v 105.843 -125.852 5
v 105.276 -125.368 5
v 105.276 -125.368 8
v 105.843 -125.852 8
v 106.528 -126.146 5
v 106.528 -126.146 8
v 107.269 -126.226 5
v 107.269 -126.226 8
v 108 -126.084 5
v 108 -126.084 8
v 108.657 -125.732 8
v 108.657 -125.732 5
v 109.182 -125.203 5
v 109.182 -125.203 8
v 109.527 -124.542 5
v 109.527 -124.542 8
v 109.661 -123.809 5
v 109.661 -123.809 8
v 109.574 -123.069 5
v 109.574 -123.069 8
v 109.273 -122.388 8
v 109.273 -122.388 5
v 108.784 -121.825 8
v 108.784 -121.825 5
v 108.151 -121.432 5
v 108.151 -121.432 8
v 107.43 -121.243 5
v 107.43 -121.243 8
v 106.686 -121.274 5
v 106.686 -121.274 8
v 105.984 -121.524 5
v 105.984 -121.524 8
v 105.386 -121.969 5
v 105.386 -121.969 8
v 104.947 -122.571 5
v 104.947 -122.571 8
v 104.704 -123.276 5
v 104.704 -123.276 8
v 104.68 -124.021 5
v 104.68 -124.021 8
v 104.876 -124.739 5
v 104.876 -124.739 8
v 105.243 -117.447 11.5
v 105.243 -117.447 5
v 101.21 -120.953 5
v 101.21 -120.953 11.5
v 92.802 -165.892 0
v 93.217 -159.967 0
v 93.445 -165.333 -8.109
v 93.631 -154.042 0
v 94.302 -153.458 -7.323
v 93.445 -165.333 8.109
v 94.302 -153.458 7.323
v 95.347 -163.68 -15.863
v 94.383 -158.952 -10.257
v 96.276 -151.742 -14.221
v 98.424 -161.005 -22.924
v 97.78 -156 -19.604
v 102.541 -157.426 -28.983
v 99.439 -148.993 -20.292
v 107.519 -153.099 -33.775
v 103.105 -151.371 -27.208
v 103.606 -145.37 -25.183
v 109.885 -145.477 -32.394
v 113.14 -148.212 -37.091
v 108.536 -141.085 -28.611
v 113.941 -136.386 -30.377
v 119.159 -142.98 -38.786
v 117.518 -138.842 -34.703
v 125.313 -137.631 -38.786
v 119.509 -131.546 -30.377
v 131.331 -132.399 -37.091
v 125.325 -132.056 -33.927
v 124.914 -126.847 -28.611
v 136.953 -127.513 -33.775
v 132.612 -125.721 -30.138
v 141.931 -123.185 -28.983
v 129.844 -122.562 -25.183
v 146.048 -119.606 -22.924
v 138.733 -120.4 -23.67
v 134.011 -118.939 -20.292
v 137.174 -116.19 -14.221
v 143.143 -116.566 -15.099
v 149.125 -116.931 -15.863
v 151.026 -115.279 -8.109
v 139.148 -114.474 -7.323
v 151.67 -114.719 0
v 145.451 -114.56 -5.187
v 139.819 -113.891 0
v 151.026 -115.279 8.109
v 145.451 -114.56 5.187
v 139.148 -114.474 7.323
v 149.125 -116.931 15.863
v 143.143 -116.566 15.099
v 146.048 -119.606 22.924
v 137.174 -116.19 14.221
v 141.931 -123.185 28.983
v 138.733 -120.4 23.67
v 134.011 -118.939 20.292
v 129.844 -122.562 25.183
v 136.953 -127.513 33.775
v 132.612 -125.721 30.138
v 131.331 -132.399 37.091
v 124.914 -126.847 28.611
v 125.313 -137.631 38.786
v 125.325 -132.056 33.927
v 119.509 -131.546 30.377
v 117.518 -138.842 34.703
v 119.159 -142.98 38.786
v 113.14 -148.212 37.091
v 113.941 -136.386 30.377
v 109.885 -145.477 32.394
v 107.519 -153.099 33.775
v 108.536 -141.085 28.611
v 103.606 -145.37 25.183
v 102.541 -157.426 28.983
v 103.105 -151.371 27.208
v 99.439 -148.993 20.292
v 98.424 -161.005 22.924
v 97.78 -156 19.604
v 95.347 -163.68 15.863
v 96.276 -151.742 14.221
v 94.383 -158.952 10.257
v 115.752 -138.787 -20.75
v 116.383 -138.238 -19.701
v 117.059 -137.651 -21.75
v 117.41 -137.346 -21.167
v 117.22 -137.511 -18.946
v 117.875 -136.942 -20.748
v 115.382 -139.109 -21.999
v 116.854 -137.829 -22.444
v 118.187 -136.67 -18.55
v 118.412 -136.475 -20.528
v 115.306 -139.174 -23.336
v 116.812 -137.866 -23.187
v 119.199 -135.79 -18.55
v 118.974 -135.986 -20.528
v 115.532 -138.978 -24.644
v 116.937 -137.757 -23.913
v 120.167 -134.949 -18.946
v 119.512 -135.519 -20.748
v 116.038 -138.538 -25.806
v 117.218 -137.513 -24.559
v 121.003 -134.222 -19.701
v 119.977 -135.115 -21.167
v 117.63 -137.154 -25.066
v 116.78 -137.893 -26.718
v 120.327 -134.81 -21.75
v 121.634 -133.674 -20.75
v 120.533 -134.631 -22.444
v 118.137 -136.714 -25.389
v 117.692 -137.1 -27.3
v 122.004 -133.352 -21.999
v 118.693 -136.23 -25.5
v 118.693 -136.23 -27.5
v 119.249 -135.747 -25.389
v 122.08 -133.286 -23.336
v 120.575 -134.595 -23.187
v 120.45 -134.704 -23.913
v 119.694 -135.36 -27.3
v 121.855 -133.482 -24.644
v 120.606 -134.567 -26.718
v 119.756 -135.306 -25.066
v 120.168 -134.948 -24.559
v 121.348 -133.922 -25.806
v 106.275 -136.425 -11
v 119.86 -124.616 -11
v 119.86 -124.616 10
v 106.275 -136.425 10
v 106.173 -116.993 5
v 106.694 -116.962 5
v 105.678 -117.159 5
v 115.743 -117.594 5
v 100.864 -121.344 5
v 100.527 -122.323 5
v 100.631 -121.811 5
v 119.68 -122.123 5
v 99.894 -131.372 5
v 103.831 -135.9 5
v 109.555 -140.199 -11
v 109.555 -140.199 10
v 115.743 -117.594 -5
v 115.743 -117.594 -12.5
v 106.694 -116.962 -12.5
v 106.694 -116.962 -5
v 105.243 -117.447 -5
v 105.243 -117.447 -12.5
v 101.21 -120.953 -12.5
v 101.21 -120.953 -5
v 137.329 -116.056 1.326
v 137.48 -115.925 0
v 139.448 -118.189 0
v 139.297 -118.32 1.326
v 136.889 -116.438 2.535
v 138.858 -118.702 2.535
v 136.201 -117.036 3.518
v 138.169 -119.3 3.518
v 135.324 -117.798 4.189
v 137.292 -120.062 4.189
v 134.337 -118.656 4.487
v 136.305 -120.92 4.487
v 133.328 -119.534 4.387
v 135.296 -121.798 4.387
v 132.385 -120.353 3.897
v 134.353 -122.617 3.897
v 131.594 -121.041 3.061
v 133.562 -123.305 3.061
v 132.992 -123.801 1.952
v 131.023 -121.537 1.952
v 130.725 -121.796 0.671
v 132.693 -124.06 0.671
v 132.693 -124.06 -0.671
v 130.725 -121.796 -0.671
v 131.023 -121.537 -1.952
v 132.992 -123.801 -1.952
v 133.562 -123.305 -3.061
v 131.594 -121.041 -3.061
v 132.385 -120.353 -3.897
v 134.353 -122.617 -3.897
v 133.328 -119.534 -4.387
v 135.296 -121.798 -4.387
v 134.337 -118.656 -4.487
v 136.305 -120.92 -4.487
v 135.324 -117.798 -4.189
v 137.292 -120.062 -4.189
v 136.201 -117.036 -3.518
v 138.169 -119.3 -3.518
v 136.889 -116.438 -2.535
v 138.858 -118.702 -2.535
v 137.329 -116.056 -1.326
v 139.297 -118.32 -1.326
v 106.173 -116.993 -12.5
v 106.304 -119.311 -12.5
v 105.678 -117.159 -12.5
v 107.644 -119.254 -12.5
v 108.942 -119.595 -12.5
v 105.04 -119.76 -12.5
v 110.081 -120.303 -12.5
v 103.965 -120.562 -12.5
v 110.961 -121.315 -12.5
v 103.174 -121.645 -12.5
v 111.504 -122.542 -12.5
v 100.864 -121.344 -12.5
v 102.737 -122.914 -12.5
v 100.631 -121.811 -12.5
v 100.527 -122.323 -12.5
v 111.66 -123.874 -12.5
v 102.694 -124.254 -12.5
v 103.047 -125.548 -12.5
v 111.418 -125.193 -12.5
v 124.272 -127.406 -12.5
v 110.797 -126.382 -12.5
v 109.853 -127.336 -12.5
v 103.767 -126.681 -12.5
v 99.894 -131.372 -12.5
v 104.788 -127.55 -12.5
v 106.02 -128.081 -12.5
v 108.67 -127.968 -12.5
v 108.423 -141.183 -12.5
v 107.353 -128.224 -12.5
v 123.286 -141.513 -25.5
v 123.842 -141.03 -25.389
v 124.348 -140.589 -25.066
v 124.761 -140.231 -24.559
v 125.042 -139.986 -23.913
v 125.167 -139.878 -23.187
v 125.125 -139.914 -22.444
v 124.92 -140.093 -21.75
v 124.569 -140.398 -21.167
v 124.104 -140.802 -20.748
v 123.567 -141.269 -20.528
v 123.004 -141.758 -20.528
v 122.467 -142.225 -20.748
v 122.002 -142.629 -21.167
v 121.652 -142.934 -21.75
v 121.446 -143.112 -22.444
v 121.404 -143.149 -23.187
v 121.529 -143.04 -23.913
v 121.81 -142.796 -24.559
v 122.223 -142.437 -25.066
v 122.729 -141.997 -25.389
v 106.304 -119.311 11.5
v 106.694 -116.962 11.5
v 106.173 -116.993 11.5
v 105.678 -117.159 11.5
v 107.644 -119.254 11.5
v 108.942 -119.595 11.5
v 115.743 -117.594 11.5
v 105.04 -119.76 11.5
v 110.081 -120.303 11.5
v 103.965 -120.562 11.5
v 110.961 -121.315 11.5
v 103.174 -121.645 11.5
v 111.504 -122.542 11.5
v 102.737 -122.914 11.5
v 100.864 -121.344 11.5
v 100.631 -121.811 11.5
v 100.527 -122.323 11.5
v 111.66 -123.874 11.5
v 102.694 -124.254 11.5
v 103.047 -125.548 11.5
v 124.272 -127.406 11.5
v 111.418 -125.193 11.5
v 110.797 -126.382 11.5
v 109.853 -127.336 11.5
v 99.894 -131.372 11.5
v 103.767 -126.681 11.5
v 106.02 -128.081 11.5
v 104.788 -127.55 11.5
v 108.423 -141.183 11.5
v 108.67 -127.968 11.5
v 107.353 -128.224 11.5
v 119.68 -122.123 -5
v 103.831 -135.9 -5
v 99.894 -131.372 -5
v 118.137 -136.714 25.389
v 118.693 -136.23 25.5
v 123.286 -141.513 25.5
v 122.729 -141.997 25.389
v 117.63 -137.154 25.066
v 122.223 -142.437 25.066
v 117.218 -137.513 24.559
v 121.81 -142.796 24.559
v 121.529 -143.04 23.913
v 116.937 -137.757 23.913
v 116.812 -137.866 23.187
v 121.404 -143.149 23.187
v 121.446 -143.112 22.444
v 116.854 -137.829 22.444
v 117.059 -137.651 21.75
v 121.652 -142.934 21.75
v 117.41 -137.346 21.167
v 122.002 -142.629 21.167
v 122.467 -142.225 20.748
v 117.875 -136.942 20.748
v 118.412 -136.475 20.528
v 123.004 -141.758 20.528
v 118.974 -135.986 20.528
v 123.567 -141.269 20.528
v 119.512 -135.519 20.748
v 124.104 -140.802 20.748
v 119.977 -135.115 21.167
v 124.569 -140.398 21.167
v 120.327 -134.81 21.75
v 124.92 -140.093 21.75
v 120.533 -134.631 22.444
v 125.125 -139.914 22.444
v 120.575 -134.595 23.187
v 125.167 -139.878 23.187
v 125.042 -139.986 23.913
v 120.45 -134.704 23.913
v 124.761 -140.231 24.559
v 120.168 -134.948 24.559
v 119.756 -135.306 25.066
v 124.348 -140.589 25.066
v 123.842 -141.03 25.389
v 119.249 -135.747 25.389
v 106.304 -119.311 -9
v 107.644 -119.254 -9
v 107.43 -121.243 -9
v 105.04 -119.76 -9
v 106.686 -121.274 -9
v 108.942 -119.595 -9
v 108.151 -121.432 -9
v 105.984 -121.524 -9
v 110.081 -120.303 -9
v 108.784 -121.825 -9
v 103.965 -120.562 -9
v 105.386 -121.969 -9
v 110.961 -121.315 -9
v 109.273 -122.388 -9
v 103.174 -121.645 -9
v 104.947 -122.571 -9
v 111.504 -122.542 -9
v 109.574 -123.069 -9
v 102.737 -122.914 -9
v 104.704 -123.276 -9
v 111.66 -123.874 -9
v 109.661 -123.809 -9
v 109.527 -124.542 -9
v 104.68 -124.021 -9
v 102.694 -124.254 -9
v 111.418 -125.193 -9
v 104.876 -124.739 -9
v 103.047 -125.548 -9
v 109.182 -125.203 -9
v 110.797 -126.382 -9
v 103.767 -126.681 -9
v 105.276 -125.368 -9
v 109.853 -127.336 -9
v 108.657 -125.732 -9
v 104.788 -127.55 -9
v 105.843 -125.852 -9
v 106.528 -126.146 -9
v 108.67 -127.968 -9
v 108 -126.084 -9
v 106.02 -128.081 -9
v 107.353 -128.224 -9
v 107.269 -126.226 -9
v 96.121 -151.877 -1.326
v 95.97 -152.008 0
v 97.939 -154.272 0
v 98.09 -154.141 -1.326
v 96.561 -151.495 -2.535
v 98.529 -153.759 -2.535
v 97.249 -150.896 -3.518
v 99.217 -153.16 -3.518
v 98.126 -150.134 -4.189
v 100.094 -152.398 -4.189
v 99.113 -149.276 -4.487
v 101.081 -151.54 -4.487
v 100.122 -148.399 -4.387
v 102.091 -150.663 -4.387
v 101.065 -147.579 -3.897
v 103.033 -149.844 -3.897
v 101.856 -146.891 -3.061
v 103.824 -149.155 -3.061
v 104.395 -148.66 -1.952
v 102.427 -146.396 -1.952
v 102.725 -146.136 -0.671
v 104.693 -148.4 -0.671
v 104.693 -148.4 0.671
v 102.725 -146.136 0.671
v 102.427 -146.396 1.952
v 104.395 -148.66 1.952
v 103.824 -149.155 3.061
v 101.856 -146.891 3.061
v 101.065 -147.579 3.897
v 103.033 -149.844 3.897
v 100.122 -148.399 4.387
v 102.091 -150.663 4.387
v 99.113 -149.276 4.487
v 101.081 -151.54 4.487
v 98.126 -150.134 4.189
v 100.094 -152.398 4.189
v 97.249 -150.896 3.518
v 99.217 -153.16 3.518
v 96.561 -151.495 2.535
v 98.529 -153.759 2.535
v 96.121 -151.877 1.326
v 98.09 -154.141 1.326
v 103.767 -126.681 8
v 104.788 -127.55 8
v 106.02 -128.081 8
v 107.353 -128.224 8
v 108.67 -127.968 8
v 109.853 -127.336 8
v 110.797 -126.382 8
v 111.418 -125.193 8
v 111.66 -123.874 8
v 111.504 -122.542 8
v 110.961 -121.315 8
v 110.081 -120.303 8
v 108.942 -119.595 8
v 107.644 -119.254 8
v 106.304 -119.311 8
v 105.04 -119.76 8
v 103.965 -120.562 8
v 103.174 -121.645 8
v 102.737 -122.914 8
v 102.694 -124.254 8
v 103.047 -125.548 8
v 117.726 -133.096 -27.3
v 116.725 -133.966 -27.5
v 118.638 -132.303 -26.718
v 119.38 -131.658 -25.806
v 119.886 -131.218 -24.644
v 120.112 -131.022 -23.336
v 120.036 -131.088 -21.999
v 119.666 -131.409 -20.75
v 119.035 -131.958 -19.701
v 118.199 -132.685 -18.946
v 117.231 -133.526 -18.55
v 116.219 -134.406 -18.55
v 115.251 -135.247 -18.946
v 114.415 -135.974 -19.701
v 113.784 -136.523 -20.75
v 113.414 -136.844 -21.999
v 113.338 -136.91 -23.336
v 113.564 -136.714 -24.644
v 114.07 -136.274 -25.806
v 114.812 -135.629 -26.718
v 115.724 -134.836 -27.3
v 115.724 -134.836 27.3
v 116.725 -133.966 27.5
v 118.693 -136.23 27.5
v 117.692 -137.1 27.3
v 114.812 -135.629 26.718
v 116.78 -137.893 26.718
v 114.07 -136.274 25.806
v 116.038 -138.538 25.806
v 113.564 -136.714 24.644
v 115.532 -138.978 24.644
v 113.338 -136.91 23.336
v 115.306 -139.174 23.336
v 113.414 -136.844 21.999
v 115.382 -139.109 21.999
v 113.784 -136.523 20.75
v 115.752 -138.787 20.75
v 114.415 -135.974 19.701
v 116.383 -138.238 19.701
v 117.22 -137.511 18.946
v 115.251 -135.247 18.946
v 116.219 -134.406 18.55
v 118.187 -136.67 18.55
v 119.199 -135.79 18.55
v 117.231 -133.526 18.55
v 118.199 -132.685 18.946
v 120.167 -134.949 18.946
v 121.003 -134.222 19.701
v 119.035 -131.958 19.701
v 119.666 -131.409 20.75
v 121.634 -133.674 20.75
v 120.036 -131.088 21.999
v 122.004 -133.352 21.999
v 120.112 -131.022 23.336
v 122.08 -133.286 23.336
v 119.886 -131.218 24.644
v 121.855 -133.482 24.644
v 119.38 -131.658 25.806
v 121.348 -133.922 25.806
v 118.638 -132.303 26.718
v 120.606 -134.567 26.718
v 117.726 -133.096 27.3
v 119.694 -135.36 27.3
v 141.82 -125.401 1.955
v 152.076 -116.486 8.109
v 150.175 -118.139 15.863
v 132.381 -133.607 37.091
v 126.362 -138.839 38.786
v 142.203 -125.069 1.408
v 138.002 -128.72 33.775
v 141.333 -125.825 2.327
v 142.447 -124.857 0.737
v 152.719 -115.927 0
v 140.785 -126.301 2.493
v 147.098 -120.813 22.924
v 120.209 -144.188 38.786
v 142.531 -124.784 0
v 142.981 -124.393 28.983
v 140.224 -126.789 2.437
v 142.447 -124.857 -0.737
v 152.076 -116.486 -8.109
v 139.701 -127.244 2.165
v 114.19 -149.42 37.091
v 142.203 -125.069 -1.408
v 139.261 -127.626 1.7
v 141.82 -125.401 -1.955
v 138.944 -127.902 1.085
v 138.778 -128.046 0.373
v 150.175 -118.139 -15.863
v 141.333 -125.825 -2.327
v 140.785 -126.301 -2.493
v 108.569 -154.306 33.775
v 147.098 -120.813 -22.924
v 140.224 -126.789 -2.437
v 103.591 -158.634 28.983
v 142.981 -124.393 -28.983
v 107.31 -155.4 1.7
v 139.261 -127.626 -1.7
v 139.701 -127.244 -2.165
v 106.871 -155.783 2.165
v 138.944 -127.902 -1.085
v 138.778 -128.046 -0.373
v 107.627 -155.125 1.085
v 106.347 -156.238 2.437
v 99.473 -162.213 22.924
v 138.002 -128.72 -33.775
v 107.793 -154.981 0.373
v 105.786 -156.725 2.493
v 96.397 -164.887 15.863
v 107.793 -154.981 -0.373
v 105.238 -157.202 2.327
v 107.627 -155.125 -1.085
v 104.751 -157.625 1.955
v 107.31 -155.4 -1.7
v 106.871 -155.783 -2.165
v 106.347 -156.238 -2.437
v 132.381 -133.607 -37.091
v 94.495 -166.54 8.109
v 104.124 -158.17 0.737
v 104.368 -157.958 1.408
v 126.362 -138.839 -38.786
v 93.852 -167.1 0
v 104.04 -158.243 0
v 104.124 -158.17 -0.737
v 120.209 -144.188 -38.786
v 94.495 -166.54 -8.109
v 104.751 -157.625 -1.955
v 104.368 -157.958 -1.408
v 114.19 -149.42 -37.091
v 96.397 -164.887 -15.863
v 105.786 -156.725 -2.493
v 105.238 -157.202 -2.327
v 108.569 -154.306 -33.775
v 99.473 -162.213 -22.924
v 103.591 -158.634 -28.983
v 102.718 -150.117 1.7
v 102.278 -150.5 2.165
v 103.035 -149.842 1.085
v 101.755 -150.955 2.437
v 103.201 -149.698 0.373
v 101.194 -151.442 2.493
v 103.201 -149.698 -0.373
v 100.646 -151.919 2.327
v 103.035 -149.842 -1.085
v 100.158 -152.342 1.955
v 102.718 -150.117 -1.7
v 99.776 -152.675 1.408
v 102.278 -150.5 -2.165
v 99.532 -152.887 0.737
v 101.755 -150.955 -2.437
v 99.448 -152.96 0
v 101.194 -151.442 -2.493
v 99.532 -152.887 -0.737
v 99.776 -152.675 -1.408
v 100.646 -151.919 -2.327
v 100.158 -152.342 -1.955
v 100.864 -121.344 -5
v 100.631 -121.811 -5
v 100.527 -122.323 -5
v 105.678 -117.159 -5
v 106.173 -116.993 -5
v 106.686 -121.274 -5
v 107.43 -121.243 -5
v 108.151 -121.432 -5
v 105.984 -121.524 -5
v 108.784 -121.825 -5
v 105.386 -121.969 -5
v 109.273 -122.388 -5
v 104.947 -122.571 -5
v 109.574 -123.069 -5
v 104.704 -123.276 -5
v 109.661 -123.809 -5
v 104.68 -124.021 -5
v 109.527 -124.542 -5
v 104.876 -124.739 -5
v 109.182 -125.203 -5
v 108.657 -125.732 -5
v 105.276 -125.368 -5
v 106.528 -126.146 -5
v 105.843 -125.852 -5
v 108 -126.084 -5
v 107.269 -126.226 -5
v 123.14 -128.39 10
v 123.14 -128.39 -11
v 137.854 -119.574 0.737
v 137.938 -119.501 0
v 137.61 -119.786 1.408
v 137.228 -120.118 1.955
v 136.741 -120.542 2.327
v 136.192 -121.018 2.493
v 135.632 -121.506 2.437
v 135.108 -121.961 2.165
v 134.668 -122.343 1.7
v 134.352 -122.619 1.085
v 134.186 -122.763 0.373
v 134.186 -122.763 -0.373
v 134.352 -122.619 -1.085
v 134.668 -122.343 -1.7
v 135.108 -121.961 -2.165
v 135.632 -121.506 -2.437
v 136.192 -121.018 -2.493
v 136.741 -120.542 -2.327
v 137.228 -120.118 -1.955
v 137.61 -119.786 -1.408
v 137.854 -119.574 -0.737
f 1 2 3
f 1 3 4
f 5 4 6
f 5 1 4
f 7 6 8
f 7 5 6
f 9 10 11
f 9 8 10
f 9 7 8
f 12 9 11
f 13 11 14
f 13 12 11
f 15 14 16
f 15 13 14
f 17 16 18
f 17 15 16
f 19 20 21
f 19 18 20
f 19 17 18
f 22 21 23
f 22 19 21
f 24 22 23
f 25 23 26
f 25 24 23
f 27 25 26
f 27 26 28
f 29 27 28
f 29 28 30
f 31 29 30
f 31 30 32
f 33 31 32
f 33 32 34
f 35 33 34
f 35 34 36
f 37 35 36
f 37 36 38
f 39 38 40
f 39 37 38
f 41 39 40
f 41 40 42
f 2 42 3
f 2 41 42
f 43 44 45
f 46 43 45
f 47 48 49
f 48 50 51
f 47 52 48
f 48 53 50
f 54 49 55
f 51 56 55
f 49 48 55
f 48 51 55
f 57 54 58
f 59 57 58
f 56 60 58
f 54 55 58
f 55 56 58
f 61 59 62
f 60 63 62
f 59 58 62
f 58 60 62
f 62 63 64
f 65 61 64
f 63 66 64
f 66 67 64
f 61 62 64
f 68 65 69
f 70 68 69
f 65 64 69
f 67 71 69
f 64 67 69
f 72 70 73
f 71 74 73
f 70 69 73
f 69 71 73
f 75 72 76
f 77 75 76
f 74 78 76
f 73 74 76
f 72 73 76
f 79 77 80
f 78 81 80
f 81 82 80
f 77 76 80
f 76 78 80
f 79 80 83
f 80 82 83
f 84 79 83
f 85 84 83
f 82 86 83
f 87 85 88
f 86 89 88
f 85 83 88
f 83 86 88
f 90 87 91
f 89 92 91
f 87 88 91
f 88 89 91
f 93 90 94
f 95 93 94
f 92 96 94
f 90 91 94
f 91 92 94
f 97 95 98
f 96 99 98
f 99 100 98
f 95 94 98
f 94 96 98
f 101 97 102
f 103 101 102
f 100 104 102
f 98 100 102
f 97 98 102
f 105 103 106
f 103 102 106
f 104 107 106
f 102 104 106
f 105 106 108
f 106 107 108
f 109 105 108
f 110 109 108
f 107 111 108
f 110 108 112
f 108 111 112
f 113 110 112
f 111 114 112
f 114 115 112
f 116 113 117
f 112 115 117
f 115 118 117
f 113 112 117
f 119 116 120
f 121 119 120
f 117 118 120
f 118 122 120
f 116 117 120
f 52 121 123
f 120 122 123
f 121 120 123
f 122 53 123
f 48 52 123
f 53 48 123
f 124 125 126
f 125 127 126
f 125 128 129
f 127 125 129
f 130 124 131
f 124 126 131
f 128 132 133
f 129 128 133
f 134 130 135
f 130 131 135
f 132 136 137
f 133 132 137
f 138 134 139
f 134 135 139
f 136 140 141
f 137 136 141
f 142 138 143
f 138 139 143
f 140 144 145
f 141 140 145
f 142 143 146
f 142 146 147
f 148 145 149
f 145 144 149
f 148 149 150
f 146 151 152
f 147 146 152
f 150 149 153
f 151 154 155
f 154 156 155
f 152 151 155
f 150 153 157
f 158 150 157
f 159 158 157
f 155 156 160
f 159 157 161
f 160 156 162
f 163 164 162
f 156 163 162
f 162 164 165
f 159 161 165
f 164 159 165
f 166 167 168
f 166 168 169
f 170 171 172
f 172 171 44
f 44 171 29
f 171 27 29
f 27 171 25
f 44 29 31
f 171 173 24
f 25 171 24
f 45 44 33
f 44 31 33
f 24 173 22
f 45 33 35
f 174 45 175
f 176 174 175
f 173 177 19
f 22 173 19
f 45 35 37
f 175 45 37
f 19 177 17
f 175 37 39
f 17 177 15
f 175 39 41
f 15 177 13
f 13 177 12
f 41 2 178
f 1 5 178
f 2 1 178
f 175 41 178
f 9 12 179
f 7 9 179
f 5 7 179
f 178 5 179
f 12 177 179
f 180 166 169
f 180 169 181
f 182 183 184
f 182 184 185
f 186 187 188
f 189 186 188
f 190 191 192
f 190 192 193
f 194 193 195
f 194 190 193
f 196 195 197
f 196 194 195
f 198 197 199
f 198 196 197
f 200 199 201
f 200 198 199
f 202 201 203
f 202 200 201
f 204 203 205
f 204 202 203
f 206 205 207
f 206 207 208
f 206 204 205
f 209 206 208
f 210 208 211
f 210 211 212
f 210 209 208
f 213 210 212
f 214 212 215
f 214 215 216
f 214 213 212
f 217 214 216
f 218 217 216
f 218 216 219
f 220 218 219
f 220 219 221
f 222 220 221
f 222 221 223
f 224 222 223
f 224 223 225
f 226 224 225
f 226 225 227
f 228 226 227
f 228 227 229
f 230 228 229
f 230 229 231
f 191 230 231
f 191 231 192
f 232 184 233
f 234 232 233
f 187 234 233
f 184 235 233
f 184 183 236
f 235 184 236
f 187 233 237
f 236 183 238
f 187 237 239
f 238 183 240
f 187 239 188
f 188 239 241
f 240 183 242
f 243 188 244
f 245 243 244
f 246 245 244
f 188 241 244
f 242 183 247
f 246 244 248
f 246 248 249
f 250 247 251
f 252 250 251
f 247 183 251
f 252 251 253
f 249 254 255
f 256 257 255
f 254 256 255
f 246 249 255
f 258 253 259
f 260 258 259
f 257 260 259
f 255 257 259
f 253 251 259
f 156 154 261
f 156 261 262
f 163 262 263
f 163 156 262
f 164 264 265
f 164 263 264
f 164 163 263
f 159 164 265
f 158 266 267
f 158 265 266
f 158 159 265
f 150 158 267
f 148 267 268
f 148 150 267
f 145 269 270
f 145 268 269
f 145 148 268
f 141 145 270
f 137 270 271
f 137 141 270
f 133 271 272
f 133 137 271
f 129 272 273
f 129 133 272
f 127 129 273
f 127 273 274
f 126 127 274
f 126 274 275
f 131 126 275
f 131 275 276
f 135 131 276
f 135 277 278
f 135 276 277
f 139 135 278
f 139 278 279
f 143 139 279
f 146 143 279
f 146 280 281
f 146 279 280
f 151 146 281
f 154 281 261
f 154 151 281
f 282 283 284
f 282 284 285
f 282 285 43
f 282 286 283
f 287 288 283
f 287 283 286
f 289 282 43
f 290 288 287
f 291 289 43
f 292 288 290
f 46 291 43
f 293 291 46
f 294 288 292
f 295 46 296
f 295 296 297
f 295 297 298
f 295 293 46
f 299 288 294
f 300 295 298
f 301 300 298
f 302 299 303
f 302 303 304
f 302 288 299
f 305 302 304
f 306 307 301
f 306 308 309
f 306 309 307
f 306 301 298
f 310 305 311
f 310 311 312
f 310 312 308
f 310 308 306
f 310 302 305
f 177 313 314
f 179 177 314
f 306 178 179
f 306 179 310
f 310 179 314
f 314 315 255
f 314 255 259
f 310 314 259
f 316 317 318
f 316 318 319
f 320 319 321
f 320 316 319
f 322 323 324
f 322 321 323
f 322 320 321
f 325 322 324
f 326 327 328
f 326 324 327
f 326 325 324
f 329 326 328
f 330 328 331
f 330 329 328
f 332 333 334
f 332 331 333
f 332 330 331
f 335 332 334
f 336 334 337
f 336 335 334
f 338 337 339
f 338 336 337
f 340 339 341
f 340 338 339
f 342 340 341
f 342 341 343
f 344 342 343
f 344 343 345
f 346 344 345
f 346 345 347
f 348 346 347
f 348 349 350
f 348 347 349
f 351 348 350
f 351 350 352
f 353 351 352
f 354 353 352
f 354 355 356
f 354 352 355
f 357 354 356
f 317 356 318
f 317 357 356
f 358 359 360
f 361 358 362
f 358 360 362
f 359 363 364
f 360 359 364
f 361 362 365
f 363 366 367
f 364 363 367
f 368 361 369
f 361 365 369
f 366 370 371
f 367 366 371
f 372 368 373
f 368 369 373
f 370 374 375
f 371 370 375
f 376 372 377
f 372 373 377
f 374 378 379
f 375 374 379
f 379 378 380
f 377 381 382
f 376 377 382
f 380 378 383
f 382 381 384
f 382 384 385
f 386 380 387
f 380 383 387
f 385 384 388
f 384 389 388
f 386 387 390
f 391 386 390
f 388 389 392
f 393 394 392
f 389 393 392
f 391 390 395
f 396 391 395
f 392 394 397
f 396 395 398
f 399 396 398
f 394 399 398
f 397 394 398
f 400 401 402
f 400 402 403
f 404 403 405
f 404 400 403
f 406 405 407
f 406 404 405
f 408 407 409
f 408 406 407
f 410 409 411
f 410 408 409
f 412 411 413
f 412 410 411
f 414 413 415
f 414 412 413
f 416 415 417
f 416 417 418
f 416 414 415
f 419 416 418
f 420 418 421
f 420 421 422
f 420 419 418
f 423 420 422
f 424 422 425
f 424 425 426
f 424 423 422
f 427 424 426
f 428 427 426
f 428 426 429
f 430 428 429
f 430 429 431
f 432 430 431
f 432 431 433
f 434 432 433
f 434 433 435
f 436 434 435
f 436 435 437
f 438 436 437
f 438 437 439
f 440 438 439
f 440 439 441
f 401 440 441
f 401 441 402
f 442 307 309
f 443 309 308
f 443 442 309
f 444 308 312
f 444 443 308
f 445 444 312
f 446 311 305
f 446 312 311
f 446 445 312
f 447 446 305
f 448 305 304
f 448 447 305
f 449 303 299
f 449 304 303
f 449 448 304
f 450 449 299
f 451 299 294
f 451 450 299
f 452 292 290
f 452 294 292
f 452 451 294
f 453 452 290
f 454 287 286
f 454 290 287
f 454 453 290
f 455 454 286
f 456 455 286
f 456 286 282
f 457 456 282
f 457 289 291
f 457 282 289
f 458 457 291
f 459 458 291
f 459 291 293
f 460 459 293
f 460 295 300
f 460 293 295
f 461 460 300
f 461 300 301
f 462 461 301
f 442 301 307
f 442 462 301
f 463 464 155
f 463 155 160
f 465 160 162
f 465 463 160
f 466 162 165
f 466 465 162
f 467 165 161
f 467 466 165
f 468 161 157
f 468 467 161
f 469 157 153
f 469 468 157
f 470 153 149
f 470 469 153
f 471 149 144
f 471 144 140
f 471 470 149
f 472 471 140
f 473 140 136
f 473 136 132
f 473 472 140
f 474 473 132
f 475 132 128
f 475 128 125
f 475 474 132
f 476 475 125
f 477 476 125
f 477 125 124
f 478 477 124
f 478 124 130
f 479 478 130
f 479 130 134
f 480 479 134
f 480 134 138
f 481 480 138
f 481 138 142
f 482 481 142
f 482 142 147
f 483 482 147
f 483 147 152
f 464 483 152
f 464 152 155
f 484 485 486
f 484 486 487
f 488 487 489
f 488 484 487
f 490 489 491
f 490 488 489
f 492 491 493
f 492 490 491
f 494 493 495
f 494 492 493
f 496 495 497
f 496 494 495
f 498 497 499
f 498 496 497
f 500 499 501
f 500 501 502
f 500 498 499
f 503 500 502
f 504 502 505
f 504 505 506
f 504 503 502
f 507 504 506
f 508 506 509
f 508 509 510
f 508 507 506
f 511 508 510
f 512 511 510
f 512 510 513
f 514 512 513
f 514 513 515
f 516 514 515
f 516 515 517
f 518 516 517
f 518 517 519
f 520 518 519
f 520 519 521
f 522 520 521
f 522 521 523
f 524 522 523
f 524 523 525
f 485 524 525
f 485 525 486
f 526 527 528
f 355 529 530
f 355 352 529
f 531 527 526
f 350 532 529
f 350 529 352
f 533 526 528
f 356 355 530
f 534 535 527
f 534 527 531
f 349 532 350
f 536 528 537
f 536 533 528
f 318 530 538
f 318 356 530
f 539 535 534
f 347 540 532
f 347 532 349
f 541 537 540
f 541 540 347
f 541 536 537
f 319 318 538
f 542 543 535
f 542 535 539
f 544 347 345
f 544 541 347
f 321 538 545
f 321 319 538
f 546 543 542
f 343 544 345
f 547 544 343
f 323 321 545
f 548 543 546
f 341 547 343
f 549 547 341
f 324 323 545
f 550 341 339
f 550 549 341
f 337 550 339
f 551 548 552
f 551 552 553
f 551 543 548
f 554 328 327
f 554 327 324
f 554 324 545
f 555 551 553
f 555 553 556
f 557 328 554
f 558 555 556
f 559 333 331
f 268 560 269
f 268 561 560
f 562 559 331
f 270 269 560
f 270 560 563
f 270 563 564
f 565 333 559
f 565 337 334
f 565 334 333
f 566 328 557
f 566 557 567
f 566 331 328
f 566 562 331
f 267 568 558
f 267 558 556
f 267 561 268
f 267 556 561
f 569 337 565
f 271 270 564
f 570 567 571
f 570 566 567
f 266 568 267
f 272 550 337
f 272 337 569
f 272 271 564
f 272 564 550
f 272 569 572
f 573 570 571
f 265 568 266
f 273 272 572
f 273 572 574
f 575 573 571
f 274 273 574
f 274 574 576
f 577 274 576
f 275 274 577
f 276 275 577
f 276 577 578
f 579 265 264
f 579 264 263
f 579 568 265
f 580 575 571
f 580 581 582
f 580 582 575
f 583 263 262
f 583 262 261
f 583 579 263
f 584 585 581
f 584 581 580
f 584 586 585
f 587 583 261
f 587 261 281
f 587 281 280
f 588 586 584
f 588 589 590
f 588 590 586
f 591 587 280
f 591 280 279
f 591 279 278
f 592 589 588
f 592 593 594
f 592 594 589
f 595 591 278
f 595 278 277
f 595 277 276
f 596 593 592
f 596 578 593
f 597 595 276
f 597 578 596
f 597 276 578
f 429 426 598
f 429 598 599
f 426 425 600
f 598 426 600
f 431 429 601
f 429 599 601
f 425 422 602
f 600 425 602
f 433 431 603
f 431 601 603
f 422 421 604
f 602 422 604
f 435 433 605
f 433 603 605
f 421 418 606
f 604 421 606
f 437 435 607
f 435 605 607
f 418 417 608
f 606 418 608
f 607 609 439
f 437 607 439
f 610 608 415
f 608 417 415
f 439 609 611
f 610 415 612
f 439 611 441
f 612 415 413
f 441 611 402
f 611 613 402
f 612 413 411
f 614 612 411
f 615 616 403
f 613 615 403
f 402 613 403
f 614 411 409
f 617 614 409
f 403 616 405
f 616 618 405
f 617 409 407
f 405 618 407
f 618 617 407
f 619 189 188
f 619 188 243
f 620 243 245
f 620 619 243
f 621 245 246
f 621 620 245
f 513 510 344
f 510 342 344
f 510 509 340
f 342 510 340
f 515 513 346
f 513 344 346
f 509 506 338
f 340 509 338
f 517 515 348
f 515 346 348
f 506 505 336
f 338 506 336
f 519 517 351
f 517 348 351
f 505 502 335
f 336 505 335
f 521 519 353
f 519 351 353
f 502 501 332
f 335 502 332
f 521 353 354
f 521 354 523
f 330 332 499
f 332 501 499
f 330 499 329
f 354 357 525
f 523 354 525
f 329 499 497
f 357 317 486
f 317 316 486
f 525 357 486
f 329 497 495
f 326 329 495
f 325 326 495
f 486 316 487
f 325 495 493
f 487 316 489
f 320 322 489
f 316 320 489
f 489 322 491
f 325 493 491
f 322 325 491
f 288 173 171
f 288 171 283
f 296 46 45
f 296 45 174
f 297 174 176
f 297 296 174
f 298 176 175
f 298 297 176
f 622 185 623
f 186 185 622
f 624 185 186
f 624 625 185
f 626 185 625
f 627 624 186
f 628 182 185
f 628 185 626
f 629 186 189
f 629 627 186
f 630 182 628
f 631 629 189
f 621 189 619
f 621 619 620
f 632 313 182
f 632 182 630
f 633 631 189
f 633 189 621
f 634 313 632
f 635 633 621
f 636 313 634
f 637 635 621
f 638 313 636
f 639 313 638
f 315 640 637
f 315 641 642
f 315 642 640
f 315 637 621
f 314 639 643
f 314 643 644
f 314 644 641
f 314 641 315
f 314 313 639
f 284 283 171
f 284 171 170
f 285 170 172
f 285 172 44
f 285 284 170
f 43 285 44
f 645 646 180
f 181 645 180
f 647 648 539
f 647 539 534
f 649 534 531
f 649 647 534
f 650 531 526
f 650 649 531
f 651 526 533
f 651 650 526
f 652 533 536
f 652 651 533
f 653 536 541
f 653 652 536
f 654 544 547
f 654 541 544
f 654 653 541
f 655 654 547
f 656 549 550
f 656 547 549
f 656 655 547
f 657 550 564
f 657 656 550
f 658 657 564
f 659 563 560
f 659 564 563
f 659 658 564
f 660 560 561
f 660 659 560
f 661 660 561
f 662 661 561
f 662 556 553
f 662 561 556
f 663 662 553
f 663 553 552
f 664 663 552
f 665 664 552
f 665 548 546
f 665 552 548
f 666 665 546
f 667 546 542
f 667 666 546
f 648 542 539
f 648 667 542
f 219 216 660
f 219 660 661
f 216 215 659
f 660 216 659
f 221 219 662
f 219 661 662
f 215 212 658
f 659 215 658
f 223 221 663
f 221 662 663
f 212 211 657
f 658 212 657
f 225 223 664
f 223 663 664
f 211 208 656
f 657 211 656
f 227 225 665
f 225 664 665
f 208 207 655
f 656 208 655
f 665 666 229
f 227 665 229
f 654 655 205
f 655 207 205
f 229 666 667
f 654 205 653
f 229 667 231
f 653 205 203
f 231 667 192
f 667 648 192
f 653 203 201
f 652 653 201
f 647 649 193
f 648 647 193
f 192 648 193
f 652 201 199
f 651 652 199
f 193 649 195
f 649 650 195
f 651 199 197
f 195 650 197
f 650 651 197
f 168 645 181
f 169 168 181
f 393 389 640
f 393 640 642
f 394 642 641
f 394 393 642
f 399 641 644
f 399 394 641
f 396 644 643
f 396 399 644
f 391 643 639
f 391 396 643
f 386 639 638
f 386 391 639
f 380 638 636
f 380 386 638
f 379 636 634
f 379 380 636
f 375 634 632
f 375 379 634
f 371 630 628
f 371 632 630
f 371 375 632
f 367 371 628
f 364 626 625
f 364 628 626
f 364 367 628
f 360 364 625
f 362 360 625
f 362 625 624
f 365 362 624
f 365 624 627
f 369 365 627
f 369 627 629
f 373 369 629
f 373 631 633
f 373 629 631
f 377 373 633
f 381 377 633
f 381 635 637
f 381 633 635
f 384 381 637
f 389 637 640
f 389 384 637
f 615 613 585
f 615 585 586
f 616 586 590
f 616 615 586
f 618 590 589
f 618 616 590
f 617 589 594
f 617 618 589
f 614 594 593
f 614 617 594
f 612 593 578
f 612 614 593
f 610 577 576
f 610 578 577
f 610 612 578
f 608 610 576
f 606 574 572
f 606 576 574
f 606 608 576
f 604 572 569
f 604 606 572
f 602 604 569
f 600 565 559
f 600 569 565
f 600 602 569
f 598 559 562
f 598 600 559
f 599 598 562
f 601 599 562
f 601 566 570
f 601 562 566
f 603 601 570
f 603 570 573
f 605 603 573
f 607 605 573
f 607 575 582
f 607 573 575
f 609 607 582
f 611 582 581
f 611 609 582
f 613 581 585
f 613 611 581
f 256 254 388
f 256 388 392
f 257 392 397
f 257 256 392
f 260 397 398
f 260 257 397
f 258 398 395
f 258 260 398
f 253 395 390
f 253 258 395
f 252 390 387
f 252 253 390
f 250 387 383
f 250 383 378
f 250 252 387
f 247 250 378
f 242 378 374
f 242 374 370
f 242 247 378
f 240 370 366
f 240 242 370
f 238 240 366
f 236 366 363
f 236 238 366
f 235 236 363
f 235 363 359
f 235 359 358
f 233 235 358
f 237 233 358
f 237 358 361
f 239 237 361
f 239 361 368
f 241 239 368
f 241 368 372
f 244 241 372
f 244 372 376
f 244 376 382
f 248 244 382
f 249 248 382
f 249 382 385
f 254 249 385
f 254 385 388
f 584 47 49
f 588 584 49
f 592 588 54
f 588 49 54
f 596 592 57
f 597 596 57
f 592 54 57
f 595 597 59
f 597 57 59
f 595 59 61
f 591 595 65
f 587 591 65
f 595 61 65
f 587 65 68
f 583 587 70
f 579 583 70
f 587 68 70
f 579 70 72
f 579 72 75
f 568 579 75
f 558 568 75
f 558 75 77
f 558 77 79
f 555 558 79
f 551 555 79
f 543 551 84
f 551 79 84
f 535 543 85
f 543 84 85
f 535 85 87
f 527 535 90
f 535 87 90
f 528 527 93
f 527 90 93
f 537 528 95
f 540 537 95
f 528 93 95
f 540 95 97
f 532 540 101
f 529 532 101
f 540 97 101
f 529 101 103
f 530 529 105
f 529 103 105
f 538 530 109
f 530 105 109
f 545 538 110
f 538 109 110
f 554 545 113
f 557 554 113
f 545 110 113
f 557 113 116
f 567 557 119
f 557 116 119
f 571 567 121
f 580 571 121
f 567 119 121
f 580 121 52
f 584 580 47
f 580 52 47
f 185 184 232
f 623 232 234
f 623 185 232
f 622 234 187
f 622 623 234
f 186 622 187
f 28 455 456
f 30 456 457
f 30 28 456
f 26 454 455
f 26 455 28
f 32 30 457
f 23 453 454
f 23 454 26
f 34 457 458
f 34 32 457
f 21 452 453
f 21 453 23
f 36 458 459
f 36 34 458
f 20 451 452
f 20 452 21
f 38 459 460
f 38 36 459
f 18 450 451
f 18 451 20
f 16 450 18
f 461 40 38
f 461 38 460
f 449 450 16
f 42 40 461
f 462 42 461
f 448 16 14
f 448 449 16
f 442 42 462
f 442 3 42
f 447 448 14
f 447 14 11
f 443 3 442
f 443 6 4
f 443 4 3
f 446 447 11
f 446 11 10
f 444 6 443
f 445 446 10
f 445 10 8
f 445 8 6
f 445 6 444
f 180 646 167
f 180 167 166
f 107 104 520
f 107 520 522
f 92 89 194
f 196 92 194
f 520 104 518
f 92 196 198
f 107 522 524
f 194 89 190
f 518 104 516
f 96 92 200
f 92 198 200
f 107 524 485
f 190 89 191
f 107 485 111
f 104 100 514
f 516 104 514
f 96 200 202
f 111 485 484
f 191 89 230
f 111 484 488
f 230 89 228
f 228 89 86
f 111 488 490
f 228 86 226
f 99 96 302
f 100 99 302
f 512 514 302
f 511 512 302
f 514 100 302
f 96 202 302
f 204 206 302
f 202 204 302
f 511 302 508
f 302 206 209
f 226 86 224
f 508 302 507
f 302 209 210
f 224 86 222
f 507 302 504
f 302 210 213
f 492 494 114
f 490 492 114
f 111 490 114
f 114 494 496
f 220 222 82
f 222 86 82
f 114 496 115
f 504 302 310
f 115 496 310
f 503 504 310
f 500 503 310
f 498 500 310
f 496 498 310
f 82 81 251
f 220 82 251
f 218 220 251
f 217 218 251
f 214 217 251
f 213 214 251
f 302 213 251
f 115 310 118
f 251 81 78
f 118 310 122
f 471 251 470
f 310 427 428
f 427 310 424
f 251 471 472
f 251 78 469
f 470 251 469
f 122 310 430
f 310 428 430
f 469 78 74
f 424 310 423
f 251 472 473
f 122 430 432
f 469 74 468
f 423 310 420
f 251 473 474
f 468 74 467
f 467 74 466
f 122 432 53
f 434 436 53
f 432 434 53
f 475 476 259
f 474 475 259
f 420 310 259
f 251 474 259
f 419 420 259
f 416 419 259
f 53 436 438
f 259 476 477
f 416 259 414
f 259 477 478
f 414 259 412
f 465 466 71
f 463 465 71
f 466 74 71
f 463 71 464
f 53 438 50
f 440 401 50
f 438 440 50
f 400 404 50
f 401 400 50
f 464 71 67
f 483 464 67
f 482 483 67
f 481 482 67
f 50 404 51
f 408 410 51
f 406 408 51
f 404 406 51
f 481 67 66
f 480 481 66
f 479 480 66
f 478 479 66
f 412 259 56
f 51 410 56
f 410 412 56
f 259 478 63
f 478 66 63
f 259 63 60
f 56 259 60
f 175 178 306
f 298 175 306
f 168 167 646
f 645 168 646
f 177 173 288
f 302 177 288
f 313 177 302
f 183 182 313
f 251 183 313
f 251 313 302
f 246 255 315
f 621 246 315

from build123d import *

# Parameters (mm, degrees)
CYLINDER039_R             = 4.5
CYLINDER039_DEPTH         = 21
ARRAY005_COUNT            = 4
CYLINDER038_R             = 2.5
CYLINDER038_DEPTH         = 21
ARRAY004_COUNT            = 4
FUSION016_PLACEMENT_ANGLE = 90
CYLINDER037_R             = 39
CYLINDER037_DEPTH         = 10
CHAMFER004_SIZE           = 8.4
CYLINDER029_R             = 2.5
CYLINDER029_DEPTH         = 32
CYLINDER028_R             = 4.5
CYLINDER028_DEPTH         = 5
CYLINDER030_R             = 4.5
CYLINDER030_DEPTH         = 5
BOX010_W                  = 24
BOX010_H                  = 14
BOX010_DEPTH              = 10
BOX009_W                  = 18
BOX009_H                  = 10
BOX009_DEPTH              = 21
BOX008_W                  = 21
BOX008_H                  = 22
BOX008_DEPTH              = 24
CHAMFER001_SIZE           = 7
FILLET001_R               = 2
FUSION017_PLACEMENT_ANGLE = 221


with BuildPart() as array005:
    # Cylinder039 → Cylinder039 (new body)
    with BuildSketch(Plane(origin=(23, 0, 0), x_dir=(1, 0, 0), z_dir=(0, 0, 1))):
        Circle(CYLINDER039_R)
    extrude(amount=CYLINDER039_DEPTH)

    # Array005: Array005 ×4 about axis
    array005_axis = Axis((0, 0, 0), (0, 0, 1))


with BuildPart() as array005_1:
    add(array005.part)
    for i in range(1, ARRAY005_COUNT):
        add(array005.part.rotate(array005_axis, i * 360 / ARRAY005_COUNT))


with BuildPart() as array005_2:
    # Array005 placement: moved
    add(array005_1.part.moved(Location((0, 0, -20))))


with BuildPart() as fusion016:
    # Cylinder038 → Cylinder038 (new body)
    with BuildSketch(Plane(origin=(23, 0, 0), x_dir=(1, 0, 0), z_dir=(0, 0, 1))):
        Circle(CYLINDER038_R)
    extrude(amount=CYLINDER038_DEPTH)

    # Array004: Fusion016 ×4 about axis
    array004_axis = Axis((0, 0, 0), (0, 0, 1))


with BuildPart() as fusion016_1:
    add(fusion016.part)
    for i in range(1, ARRAY004_COUNT):
        add(fusion016.part.rotate(array004_axis, i * 360 / ARRAY004_COUNT))

    # Fusion016: union Array005
    add(array005_2.part)


with BuildPart() as fusion016_2:
    # Fusion016 placement: moved
    add(fusion016_1.part.moved(Location((14.5, -61, 0))).rotate(Axis((14.5, -61, 0), (-1, 0, 0)), FUSION016_PLACEMENT_ANGLE))


with BuildPart() as cut034:
    # Cylinder037 → Cylinder037 (new body)
    with BuildSketch(Plane(origin=(14.5, -70, 0), x_dir=(1, 0, 0), z_dir=(0, 1, 0))):
        Circle(CYLINDER037_R)
    extrude(amount=CYLINDER037_DEPTH)

    # Chamfer004
    chamfer004_edges = [cut034.edges().sort_by_distance(p)[0] for p in [
        (-24.5, -70, 0),
    ]]
    chamfer(chamfer004_edges, length=CHAMFER004_SIZE)


with BuildPart() as cut034_1:
    # Chamfer004 placement: moved
    add(cut034.part.moved(Location((0, 7, 0))))

    # Cut034: cut Fusion016
    add(fusion016_2.part, mode=Mode.SUBTRACT)


with BuildPart() as cylinder029:
    # Cylinder029 → Cylinder029 (new body)
    with BuildSketch(Plane(origin=(55, -39, -20), x_dir=(1, 0, 0), z_dir=(0, 0, 1))):
        Circle(CYLINDER029_R)
    extrude(amount=CYLINDER029_DEPTH)


with BuildPart() as cylinder028:
    # Cylinder028 → Cylinder028 (new body)
    with BuildSketch(Plane(origin=(55, -39, 8), x_dir=(1, 0, 0), z_dir=(0, 0, 1))):
        Circle(CYLINDER028_R)
    extrude(amount=CYLINDER028_DEPTH)


with BuildPart() as cylinder030:
    # Cylinder030 → Cylinder030 (new body)
    with BuildSketch(Plane(origin=(55, -39, -14), x_dir=(1, 0, 0), z_dir=(0, 0, 1))):
        Circle(CYLINDER030_R)
    extrude(amount=CYLINDER030_DEPTH)


with BuildPart() as box010:
    # Box010 → Box010 (new body)
    with BuildSketch(Plane(origin=(43, -46, -5), x_dir=(1, 0, 0), z_dir=(0, 0, 1))):
        with Locations((12, 7)):
            Rectangle(BOX010_W, BOX010_H)
    extrude(amount=BOX010_DEPTH)


with BuildPart() as box009:
    # Box009 → Box009 (new body)
    with BuildSketch(Plane(origin=(46, -30, -11), x_dir=(1, 0, 0), z_dir=(0, 0, 1))):
        with Locations((9, 5)):
            Rectangle(BOX009_W, BOX009_H)
    extrude(amount=BOX009_DEPTH)


with BuildPart() as fusion017:
    # Box008 → Box008 (new body)
    with BuildSketch(Plane(origin=(44.5, -45, -12.5), x_dir=(1, 0, 0), z_dir=(0, 0, 1))):
        with Locations((10.5, 11)):
            Rectangle(BOX008_W, BOX008_H)
    extrude(amount=BOX008_DEPTH)

    # Cut025: cut Box009
    add(box009.part, mode=Mode.SUBTRACT)

    # Chamfer001
    chamfer001_edges = [fusion017.edges().sort_by_distance(p)[0] for p in [
        (44.5, -45, -0.5),
        (65.5, -45, -0.5),
    ]]
    chamfer(chamfer001_edges, length=CHAMFER001_SIZE)

    # Fillet001
    fillet001_edges = [fusion017.edges().sort_by_distance(p)[0] for p in [
        (51.5, -45, -0.5),
        (58.5, -45, -0.5),
    ]]
    fillet(fillet001_edges, radius=FILLET001_R)

    # Cut024: cut Box010
    add(box010.part, mode=Mode.SUBTRACT)

    # Cut027: cut Cylinder030
    add(cylinder030.part, mode=Mode.SUBTRACT)

    # Cut026: cut Cylinder028
    add(cylinder028.part, mode=Mode.SUBTRACT)

    # Cut023: cut Cylinder029
    add(cylinder029.part, mode=Mode.SUBTRACT)


with BuildPart() as fusion017_1:
    # Cut023 placement: moved
    add(fusion017.part.moved(Location((-40, -38, 0))))

    # Fusion017: union Cut034
    add(cut034_1.part)


with BuildPart() as fusion017_2:
    # Fusion017 placement: moved
    add(fusion017_1.part.moved(Location((169, -172, 0))).rotate(Axis((169, -172, 0), (0, 0, 1)), FUSION017_PLACEMENT_ANGLE))


solid = fusion017_2.part
